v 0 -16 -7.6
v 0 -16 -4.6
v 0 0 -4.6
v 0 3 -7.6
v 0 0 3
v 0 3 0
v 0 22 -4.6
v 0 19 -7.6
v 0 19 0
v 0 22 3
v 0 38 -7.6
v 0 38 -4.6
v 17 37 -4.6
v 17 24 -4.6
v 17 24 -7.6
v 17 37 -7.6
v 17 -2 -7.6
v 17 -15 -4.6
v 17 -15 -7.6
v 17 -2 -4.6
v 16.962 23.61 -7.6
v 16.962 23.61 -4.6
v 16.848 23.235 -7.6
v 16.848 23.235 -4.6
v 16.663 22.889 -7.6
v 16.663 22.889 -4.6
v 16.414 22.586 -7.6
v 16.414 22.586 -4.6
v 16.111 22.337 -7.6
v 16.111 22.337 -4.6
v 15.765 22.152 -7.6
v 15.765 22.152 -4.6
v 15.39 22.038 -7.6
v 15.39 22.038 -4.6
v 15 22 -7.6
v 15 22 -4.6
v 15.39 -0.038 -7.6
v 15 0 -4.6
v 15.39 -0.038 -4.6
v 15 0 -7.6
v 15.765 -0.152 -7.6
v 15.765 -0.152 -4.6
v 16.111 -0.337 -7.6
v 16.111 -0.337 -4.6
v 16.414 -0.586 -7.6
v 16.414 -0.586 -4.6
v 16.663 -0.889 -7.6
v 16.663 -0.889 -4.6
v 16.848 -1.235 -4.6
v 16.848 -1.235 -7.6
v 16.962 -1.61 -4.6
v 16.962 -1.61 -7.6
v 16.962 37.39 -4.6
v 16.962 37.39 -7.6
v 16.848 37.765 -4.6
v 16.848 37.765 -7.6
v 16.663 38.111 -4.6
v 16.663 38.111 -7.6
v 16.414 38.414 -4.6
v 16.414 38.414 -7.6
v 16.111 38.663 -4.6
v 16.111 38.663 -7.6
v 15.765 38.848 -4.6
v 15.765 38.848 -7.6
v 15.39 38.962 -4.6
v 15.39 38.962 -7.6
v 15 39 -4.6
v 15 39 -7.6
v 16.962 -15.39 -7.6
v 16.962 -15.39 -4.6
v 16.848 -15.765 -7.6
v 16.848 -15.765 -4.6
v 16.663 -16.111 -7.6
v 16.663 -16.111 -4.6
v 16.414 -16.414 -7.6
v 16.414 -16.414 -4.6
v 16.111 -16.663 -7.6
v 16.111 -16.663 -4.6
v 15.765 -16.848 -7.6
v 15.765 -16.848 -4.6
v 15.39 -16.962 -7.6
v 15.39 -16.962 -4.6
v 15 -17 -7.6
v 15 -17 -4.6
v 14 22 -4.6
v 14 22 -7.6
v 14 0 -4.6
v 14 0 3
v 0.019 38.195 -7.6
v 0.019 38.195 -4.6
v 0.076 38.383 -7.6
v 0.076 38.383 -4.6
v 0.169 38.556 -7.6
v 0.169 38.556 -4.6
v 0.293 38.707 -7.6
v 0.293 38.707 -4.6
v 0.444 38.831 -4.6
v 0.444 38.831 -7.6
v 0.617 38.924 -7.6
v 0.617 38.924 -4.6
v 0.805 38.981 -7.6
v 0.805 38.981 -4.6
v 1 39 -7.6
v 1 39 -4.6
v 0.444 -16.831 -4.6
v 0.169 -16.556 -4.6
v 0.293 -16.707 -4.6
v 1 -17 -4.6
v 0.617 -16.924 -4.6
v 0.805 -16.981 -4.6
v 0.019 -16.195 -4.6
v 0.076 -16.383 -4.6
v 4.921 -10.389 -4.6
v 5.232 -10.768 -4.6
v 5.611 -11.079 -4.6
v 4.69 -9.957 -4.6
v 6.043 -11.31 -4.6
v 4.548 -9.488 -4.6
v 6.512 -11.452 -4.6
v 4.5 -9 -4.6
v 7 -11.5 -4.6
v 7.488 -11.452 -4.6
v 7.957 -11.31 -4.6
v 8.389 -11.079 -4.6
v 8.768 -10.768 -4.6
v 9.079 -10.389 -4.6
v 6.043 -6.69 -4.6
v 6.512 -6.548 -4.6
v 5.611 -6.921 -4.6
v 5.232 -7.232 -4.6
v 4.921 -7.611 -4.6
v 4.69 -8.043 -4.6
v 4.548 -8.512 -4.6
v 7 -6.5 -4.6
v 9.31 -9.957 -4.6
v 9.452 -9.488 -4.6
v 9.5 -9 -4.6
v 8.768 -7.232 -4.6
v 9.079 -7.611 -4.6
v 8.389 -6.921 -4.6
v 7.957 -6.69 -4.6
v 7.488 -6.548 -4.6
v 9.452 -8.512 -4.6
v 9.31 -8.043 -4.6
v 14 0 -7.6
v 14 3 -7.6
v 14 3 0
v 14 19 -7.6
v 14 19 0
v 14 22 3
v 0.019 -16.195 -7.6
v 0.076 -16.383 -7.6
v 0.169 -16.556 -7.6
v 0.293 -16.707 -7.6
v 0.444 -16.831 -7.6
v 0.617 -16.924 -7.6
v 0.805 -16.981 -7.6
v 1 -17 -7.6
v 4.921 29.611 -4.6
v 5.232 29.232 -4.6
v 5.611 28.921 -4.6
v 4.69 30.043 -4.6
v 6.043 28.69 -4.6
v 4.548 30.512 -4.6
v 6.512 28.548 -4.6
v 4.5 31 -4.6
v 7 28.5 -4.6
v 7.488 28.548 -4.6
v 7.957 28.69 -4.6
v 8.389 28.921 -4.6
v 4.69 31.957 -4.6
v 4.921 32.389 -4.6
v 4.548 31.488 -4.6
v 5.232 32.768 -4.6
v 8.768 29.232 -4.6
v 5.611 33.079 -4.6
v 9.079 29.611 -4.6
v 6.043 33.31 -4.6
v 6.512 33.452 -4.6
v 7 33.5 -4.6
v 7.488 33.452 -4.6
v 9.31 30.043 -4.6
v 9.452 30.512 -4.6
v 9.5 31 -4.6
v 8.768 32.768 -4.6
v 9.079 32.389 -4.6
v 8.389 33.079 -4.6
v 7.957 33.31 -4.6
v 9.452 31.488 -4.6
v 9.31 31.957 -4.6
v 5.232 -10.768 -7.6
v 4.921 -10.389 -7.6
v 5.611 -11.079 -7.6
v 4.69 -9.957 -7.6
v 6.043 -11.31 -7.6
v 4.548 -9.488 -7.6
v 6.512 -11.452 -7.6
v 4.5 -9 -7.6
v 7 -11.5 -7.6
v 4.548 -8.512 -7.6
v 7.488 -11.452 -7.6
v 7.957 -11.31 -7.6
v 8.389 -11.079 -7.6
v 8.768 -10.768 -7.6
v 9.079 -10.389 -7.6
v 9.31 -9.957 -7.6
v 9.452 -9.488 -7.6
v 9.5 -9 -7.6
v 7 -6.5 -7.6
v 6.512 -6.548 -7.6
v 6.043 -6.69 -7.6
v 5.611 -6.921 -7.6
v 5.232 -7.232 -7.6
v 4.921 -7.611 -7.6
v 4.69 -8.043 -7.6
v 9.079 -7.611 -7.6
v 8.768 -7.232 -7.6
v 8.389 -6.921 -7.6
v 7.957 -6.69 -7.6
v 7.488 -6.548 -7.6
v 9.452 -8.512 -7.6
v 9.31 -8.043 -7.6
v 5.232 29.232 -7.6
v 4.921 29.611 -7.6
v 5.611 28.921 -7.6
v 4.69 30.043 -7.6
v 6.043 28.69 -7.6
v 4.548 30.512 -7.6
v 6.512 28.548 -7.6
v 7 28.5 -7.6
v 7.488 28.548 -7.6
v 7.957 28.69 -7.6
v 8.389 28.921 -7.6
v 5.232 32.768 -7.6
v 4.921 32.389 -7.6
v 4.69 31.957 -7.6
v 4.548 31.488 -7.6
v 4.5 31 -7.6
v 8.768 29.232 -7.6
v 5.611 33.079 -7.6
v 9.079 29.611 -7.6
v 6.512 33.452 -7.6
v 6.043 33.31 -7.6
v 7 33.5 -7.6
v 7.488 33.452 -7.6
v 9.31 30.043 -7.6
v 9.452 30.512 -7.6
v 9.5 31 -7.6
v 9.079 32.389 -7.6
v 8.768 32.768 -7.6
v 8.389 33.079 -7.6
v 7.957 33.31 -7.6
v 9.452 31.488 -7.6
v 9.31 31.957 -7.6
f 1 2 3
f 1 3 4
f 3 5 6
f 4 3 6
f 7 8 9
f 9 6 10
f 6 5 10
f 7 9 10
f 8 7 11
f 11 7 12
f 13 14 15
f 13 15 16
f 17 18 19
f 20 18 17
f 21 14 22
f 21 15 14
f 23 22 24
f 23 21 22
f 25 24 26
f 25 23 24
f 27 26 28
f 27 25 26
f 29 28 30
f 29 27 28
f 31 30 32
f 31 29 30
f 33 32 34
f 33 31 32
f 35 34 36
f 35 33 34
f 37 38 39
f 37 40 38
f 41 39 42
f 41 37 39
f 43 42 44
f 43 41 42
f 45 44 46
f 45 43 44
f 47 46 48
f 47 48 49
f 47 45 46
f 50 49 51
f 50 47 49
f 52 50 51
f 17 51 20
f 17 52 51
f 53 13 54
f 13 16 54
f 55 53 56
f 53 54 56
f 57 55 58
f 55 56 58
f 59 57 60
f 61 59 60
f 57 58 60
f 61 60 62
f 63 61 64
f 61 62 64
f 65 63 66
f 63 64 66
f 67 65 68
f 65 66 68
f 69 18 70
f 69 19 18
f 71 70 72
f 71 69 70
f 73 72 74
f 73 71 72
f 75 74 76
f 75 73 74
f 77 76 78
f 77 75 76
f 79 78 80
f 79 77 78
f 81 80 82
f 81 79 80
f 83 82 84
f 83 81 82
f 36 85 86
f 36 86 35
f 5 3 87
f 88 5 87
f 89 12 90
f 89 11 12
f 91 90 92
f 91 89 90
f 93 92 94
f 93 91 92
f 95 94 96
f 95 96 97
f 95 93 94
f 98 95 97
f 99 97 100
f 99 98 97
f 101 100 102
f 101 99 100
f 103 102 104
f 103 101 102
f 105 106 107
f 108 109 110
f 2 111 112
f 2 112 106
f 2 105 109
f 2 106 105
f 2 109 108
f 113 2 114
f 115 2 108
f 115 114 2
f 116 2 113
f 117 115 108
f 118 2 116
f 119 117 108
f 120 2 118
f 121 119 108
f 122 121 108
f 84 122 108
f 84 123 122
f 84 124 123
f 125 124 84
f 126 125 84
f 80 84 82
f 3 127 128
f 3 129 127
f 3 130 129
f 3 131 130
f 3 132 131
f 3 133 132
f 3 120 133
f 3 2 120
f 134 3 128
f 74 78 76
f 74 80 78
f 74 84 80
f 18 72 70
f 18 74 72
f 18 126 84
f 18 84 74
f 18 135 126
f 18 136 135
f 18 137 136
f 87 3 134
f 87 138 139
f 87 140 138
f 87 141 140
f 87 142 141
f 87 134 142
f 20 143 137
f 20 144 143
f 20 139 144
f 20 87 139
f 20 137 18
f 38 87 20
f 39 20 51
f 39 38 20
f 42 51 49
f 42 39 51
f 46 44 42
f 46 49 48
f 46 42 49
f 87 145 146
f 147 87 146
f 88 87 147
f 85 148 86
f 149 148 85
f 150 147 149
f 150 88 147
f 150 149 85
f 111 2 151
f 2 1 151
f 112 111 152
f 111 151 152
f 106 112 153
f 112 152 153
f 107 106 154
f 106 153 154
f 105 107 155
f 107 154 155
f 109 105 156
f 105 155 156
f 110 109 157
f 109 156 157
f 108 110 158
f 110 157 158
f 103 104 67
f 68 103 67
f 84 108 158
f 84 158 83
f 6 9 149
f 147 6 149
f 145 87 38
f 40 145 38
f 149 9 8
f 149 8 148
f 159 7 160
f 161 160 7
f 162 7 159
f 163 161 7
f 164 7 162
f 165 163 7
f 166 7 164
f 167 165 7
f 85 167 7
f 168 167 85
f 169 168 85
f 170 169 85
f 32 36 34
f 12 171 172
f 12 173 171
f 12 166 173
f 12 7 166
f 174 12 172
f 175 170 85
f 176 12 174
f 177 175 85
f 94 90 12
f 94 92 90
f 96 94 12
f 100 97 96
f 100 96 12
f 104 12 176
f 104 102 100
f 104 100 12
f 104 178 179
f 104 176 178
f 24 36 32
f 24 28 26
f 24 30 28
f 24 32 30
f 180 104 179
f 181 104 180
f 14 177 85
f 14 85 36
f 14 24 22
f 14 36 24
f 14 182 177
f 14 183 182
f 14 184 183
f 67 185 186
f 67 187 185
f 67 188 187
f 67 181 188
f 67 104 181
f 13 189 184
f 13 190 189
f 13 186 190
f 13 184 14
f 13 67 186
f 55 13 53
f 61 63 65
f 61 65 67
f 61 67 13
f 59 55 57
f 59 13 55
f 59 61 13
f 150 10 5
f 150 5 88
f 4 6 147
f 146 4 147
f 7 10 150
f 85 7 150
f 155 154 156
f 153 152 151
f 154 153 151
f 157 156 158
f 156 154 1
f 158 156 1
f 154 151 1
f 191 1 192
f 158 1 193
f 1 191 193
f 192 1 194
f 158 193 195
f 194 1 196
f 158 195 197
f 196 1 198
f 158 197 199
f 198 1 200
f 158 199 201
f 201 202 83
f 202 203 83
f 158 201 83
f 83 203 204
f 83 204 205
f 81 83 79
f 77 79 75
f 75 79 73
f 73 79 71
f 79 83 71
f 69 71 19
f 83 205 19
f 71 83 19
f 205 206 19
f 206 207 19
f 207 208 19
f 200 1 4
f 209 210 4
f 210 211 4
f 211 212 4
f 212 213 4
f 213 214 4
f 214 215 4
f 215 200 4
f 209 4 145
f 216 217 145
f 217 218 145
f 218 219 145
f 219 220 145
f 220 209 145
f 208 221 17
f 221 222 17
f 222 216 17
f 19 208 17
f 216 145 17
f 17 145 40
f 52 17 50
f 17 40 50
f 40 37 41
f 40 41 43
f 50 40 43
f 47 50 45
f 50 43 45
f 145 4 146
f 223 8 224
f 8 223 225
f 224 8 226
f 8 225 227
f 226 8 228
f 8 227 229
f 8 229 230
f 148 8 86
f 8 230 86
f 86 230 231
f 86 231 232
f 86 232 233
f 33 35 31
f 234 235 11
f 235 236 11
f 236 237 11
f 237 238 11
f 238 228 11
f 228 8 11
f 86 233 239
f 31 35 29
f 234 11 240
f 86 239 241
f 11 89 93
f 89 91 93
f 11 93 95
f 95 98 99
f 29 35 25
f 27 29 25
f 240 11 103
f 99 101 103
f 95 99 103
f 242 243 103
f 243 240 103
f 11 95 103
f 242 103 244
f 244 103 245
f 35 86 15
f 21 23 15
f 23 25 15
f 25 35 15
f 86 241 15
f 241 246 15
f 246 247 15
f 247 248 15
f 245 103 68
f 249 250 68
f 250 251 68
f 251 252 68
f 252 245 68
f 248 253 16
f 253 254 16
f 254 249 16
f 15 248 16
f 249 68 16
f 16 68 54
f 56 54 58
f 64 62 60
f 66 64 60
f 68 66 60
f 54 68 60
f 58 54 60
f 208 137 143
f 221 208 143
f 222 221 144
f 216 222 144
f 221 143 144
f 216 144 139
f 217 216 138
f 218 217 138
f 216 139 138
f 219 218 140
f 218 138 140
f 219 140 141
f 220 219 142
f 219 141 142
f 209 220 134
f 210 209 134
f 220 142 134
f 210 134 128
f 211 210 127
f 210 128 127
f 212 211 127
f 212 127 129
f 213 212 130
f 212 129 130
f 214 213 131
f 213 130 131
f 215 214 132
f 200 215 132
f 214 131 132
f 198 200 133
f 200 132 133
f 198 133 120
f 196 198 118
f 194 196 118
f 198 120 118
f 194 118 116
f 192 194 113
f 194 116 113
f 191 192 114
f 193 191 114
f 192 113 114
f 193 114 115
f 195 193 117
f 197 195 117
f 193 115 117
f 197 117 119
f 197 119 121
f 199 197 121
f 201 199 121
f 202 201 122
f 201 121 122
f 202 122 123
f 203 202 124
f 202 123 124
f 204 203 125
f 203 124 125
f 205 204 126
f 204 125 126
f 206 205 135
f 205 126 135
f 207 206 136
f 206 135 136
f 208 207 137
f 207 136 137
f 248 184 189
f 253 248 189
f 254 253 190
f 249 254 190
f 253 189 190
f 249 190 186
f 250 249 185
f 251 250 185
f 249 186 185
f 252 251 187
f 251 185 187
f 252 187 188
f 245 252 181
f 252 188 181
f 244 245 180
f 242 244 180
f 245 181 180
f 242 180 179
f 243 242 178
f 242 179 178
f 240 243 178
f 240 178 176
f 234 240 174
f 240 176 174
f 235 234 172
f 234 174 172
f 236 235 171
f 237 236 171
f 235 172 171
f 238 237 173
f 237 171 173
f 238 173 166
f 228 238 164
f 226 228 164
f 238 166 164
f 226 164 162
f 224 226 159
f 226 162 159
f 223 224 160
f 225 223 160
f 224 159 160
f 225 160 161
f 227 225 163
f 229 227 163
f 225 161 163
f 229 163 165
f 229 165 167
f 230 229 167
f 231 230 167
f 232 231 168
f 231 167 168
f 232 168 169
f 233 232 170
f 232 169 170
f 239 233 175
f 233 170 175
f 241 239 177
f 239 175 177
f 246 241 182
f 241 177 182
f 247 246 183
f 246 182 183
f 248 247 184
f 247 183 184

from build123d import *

# Parameters (mm, degrees)
SKETCH_W     = 14
SKETCH_H     = 22
PAD_DEPTH    = 3
SKETCH001_W  = 14
SKETCH001_H  = 3
PAD001_DEPTH = 7.6
SKETCH002_W  = 17
SKETCH002_H  = 17
SKETCH002_R  = 2.5
PAD002_DEPTH = 3
FILLET_R     = 2
FILLET001_R  = 1


with BuildPart() as part:
    # Sketch → Pad (new body)
    with BuildSketch(Plane.XY):
        with Locations((7, 11)):
            Rectangle(SKETCH_W, SKETCH_H)
    extrude(amount=PAD_DEPTH)

    # Sketch001 → Pad001 (join)
    with BuildSketch(Plane.XY):
        with Locations((7, 20.5)):
            Rectangle(SKETCH001_W, SKETCH001_H)
        with Locations((7, 1.5)):
            Rectangle(SKETCH001_W, SKETCH001_H)
    extrude(amount=-PAD001_DEPTH)

    # Sketch002 → Pad002 (join)
    with BuildSketch(Plane.XY.offset(-4.6)):
        with Locations((8.5, 30.5)):
            Rectangle(SKETCH002_W, SKETCH002_H)
        with Locations((7, 31)):
            Circle(SKETCH002_R, mode=Mode.SUBTRACT)
        with Locations((8.5, -8.5)):
            Rectangle(SKETCH002_W, SKETCH002_H)
        with Locations((7, -9)):
            Circle(SKETCH002_R, mode=Mode.SUBTRACT)
    extrude(amount=-PAD002_DEPTH)

    # Fillet
    fillet_edges = [part.edges().sort_by_distance(p)[0] for p in [
        (17, -17, -6.1),
        (17, 0, -6.1),
        (17, 22, -6.1),
        (17, 39, -6.1),
    ]]
    fillet(fillet_edges, radius=FILLET_R)

    # Fillet001
    fillet001_edges = [part.edges().sort_by_distance(p)[0] for p in [
        (0, -17, -6.1),
        (0, 39, -6.1),
    ]]
    fillet(fillet001_edges, radius=FILLET001_R)


solid = part.part
